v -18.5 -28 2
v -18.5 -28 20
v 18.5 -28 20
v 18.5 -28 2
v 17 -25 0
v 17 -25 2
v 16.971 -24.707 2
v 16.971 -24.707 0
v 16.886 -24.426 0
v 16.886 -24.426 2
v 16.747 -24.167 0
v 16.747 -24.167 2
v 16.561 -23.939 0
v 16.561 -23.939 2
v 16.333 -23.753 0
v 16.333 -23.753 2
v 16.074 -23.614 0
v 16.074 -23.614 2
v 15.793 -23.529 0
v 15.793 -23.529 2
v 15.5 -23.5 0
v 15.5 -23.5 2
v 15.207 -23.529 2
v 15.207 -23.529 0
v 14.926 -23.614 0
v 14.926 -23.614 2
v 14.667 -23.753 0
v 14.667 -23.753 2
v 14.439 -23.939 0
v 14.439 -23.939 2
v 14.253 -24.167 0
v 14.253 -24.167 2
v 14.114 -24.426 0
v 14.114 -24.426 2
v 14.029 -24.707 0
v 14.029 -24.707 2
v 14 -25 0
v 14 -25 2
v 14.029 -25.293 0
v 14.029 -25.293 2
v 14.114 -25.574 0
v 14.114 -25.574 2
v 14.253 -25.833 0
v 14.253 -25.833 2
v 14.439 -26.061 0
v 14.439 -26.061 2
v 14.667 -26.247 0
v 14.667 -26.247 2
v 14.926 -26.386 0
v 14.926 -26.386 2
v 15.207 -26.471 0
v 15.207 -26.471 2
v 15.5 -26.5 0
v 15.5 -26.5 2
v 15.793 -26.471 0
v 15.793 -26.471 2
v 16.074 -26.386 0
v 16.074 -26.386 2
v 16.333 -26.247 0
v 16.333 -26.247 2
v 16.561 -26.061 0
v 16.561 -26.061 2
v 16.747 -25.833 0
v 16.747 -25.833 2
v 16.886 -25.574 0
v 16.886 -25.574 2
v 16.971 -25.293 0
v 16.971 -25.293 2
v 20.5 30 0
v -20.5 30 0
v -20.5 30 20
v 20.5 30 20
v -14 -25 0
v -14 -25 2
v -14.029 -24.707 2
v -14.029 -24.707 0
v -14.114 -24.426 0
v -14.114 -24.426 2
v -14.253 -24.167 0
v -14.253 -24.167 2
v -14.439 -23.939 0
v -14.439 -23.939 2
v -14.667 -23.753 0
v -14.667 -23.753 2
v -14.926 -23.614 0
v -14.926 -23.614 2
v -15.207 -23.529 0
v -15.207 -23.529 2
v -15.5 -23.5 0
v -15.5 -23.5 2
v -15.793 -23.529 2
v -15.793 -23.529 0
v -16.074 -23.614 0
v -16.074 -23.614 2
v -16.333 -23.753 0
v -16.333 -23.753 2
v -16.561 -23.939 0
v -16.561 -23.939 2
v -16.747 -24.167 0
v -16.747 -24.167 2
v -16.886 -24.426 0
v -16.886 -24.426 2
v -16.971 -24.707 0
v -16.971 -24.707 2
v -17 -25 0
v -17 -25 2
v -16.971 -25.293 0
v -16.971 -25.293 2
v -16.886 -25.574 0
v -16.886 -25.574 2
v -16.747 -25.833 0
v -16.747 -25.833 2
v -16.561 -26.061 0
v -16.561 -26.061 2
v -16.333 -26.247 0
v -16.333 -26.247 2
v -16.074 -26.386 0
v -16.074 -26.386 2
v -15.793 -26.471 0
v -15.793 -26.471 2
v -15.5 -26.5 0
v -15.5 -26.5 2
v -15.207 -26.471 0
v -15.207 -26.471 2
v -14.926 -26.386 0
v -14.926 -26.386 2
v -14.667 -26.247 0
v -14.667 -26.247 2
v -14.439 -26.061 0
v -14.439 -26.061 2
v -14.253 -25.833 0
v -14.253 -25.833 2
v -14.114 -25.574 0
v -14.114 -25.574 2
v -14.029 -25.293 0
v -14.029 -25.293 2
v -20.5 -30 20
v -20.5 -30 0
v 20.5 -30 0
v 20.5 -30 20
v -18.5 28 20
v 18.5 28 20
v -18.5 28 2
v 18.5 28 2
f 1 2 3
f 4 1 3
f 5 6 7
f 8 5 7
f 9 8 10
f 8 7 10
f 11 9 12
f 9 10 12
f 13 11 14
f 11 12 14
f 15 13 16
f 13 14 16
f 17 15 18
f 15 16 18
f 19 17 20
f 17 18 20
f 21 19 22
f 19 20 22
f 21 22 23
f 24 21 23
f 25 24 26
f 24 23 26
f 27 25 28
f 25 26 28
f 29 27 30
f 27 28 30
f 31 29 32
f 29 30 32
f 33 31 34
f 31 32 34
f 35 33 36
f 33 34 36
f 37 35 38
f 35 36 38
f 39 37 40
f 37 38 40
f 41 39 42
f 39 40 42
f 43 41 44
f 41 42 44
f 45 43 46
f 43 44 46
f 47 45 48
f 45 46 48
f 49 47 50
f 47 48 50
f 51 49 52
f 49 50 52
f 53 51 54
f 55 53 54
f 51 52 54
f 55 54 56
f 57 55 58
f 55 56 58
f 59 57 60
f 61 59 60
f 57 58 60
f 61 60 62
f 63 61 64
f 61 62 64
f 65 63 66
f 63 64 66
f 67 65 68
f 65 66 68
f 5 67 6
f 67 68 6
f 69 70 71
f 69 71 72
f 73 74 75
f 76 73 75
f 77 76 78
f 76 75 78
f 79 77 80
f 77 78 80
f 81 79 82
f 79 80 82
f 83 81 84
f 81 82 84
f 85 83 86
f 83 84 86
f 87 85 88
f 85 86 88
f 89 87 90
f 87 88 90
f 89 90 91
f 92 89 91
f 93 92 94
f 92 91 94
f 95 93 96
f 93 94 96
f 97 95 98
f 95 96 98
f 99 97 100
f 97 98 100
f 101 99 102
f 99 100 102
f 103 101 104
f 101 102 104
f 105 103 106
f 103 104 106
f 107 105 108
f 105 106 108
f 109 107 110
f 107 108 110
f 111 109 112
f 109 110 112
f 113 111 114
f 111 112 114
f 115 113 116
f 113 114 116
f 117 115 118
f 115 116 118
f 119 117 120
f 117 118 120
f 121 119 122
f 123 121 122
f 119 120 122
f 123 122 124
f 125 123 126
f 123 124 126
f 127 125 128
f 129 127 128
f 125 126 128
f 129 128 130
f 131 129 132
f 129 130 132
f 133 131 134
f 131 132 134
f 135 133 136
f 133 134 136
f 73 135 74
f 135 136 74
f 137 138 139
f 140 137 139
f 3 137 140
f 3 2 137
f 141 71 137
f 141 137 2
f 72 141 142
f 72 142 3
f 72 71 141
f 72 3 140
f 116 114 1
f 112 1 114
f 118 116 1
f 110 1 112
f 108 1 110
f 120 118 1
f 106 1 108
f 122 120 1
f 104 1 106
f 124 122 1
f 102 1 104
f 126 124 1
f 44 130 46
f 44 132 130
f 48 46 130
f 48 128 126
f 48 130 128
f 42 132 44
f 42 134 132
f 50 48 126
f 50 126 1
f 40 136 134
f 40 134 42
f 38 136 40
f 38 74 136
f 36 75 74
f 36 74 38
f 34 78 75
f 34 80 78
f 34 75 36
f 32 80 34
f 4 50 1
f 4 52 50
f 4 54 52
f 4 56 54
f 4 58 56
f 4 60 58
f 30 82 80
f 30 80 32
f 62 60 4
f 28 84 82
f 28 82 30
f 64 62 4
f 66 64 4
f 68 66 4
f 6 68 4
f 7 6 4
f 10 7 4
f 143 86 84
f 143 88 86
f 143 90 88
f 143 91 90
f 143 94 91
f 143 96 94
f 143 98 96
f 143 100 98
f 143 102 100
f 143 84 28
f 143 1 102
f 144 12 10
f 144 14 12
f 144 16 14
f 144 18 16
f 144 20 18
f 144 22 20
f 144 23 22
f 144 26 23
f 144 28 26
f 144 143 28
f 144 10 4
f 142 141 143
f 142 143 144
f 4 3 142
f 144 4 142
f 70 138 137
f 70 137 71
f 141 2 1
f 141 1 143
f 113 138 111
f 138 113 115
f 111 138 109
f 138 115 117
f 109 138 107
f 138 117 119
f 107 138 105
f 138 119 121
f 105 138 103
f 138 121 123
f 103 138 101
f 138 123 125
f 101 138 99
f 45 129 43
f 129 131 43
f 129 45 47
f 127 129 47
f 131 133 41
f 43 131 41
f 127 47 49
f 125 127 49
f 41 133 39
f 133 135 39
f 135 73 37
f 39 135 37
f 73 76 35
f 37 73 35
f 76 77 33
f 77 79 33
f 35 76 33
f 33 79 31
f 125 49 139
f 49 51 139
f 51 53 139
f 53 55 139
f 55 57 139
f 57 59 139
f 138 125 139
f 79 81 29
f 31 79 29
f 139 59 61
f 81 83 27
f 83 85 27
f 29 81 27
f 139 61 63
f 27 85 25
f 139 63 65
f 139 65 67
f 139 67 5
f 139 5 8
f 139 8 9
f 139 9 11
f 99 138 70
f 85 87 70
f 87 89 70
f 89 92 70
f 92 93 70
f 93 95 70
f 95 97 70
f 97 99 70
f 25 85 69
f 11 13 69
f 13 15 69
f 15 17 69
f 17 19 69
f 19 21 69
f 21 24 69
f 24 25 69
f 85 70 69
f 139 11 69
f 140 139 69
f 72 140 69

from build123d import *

# Parameters (mm, degrees)
F0_W     = 41
F0_H     = 60
F1_DEPTH = 20
F2_W     = 37
F2_H     = 56
F3_DEPTH = 18
F5_W     = 6
F5_H     = 1.076952
F6_DEPTH = 2
F7_R     = 1.5
F8_DEPTH = 2


with BuildPart() as f1:
    # F0 (on Top) → F1 (new body)
    with BuildSketch(Plane.XY):
        Rectangle(F0_W, F0_H)
    extrude(amount=F1_DEPTH)

    # F2 (on face) → F3 (cut)
    with BuildSketch(Plane.XY.offset(20)):
        Rectangle(F2_W, F2_H)
    extrude(amount=-F3_DEPTH, mode=Mode.SUBTRACT)

    # F5 (on face) → F6 (cut)
    with BuildSketch(Plane.XZ.offset(-28)):
        with Locations((-11.5, 20.538476)):
            Rectangle(F5_W, F5_H)
    extrude(amount=-F6_DEPTH, mode=Mode.SUBTRACT)

    # F7 (on face) → F8 (cut)
    with BuildSketch(Plane.XY.offset(2)):
        with Locations((15.5, -25)):
            Circle(F7_R)
        with Locations((-15.5, -25)):
            Circle(F7_R)
    extrude(amount=-F8_DEPTH, mode=Mode.SUBTRACT)


solid = f1.part
